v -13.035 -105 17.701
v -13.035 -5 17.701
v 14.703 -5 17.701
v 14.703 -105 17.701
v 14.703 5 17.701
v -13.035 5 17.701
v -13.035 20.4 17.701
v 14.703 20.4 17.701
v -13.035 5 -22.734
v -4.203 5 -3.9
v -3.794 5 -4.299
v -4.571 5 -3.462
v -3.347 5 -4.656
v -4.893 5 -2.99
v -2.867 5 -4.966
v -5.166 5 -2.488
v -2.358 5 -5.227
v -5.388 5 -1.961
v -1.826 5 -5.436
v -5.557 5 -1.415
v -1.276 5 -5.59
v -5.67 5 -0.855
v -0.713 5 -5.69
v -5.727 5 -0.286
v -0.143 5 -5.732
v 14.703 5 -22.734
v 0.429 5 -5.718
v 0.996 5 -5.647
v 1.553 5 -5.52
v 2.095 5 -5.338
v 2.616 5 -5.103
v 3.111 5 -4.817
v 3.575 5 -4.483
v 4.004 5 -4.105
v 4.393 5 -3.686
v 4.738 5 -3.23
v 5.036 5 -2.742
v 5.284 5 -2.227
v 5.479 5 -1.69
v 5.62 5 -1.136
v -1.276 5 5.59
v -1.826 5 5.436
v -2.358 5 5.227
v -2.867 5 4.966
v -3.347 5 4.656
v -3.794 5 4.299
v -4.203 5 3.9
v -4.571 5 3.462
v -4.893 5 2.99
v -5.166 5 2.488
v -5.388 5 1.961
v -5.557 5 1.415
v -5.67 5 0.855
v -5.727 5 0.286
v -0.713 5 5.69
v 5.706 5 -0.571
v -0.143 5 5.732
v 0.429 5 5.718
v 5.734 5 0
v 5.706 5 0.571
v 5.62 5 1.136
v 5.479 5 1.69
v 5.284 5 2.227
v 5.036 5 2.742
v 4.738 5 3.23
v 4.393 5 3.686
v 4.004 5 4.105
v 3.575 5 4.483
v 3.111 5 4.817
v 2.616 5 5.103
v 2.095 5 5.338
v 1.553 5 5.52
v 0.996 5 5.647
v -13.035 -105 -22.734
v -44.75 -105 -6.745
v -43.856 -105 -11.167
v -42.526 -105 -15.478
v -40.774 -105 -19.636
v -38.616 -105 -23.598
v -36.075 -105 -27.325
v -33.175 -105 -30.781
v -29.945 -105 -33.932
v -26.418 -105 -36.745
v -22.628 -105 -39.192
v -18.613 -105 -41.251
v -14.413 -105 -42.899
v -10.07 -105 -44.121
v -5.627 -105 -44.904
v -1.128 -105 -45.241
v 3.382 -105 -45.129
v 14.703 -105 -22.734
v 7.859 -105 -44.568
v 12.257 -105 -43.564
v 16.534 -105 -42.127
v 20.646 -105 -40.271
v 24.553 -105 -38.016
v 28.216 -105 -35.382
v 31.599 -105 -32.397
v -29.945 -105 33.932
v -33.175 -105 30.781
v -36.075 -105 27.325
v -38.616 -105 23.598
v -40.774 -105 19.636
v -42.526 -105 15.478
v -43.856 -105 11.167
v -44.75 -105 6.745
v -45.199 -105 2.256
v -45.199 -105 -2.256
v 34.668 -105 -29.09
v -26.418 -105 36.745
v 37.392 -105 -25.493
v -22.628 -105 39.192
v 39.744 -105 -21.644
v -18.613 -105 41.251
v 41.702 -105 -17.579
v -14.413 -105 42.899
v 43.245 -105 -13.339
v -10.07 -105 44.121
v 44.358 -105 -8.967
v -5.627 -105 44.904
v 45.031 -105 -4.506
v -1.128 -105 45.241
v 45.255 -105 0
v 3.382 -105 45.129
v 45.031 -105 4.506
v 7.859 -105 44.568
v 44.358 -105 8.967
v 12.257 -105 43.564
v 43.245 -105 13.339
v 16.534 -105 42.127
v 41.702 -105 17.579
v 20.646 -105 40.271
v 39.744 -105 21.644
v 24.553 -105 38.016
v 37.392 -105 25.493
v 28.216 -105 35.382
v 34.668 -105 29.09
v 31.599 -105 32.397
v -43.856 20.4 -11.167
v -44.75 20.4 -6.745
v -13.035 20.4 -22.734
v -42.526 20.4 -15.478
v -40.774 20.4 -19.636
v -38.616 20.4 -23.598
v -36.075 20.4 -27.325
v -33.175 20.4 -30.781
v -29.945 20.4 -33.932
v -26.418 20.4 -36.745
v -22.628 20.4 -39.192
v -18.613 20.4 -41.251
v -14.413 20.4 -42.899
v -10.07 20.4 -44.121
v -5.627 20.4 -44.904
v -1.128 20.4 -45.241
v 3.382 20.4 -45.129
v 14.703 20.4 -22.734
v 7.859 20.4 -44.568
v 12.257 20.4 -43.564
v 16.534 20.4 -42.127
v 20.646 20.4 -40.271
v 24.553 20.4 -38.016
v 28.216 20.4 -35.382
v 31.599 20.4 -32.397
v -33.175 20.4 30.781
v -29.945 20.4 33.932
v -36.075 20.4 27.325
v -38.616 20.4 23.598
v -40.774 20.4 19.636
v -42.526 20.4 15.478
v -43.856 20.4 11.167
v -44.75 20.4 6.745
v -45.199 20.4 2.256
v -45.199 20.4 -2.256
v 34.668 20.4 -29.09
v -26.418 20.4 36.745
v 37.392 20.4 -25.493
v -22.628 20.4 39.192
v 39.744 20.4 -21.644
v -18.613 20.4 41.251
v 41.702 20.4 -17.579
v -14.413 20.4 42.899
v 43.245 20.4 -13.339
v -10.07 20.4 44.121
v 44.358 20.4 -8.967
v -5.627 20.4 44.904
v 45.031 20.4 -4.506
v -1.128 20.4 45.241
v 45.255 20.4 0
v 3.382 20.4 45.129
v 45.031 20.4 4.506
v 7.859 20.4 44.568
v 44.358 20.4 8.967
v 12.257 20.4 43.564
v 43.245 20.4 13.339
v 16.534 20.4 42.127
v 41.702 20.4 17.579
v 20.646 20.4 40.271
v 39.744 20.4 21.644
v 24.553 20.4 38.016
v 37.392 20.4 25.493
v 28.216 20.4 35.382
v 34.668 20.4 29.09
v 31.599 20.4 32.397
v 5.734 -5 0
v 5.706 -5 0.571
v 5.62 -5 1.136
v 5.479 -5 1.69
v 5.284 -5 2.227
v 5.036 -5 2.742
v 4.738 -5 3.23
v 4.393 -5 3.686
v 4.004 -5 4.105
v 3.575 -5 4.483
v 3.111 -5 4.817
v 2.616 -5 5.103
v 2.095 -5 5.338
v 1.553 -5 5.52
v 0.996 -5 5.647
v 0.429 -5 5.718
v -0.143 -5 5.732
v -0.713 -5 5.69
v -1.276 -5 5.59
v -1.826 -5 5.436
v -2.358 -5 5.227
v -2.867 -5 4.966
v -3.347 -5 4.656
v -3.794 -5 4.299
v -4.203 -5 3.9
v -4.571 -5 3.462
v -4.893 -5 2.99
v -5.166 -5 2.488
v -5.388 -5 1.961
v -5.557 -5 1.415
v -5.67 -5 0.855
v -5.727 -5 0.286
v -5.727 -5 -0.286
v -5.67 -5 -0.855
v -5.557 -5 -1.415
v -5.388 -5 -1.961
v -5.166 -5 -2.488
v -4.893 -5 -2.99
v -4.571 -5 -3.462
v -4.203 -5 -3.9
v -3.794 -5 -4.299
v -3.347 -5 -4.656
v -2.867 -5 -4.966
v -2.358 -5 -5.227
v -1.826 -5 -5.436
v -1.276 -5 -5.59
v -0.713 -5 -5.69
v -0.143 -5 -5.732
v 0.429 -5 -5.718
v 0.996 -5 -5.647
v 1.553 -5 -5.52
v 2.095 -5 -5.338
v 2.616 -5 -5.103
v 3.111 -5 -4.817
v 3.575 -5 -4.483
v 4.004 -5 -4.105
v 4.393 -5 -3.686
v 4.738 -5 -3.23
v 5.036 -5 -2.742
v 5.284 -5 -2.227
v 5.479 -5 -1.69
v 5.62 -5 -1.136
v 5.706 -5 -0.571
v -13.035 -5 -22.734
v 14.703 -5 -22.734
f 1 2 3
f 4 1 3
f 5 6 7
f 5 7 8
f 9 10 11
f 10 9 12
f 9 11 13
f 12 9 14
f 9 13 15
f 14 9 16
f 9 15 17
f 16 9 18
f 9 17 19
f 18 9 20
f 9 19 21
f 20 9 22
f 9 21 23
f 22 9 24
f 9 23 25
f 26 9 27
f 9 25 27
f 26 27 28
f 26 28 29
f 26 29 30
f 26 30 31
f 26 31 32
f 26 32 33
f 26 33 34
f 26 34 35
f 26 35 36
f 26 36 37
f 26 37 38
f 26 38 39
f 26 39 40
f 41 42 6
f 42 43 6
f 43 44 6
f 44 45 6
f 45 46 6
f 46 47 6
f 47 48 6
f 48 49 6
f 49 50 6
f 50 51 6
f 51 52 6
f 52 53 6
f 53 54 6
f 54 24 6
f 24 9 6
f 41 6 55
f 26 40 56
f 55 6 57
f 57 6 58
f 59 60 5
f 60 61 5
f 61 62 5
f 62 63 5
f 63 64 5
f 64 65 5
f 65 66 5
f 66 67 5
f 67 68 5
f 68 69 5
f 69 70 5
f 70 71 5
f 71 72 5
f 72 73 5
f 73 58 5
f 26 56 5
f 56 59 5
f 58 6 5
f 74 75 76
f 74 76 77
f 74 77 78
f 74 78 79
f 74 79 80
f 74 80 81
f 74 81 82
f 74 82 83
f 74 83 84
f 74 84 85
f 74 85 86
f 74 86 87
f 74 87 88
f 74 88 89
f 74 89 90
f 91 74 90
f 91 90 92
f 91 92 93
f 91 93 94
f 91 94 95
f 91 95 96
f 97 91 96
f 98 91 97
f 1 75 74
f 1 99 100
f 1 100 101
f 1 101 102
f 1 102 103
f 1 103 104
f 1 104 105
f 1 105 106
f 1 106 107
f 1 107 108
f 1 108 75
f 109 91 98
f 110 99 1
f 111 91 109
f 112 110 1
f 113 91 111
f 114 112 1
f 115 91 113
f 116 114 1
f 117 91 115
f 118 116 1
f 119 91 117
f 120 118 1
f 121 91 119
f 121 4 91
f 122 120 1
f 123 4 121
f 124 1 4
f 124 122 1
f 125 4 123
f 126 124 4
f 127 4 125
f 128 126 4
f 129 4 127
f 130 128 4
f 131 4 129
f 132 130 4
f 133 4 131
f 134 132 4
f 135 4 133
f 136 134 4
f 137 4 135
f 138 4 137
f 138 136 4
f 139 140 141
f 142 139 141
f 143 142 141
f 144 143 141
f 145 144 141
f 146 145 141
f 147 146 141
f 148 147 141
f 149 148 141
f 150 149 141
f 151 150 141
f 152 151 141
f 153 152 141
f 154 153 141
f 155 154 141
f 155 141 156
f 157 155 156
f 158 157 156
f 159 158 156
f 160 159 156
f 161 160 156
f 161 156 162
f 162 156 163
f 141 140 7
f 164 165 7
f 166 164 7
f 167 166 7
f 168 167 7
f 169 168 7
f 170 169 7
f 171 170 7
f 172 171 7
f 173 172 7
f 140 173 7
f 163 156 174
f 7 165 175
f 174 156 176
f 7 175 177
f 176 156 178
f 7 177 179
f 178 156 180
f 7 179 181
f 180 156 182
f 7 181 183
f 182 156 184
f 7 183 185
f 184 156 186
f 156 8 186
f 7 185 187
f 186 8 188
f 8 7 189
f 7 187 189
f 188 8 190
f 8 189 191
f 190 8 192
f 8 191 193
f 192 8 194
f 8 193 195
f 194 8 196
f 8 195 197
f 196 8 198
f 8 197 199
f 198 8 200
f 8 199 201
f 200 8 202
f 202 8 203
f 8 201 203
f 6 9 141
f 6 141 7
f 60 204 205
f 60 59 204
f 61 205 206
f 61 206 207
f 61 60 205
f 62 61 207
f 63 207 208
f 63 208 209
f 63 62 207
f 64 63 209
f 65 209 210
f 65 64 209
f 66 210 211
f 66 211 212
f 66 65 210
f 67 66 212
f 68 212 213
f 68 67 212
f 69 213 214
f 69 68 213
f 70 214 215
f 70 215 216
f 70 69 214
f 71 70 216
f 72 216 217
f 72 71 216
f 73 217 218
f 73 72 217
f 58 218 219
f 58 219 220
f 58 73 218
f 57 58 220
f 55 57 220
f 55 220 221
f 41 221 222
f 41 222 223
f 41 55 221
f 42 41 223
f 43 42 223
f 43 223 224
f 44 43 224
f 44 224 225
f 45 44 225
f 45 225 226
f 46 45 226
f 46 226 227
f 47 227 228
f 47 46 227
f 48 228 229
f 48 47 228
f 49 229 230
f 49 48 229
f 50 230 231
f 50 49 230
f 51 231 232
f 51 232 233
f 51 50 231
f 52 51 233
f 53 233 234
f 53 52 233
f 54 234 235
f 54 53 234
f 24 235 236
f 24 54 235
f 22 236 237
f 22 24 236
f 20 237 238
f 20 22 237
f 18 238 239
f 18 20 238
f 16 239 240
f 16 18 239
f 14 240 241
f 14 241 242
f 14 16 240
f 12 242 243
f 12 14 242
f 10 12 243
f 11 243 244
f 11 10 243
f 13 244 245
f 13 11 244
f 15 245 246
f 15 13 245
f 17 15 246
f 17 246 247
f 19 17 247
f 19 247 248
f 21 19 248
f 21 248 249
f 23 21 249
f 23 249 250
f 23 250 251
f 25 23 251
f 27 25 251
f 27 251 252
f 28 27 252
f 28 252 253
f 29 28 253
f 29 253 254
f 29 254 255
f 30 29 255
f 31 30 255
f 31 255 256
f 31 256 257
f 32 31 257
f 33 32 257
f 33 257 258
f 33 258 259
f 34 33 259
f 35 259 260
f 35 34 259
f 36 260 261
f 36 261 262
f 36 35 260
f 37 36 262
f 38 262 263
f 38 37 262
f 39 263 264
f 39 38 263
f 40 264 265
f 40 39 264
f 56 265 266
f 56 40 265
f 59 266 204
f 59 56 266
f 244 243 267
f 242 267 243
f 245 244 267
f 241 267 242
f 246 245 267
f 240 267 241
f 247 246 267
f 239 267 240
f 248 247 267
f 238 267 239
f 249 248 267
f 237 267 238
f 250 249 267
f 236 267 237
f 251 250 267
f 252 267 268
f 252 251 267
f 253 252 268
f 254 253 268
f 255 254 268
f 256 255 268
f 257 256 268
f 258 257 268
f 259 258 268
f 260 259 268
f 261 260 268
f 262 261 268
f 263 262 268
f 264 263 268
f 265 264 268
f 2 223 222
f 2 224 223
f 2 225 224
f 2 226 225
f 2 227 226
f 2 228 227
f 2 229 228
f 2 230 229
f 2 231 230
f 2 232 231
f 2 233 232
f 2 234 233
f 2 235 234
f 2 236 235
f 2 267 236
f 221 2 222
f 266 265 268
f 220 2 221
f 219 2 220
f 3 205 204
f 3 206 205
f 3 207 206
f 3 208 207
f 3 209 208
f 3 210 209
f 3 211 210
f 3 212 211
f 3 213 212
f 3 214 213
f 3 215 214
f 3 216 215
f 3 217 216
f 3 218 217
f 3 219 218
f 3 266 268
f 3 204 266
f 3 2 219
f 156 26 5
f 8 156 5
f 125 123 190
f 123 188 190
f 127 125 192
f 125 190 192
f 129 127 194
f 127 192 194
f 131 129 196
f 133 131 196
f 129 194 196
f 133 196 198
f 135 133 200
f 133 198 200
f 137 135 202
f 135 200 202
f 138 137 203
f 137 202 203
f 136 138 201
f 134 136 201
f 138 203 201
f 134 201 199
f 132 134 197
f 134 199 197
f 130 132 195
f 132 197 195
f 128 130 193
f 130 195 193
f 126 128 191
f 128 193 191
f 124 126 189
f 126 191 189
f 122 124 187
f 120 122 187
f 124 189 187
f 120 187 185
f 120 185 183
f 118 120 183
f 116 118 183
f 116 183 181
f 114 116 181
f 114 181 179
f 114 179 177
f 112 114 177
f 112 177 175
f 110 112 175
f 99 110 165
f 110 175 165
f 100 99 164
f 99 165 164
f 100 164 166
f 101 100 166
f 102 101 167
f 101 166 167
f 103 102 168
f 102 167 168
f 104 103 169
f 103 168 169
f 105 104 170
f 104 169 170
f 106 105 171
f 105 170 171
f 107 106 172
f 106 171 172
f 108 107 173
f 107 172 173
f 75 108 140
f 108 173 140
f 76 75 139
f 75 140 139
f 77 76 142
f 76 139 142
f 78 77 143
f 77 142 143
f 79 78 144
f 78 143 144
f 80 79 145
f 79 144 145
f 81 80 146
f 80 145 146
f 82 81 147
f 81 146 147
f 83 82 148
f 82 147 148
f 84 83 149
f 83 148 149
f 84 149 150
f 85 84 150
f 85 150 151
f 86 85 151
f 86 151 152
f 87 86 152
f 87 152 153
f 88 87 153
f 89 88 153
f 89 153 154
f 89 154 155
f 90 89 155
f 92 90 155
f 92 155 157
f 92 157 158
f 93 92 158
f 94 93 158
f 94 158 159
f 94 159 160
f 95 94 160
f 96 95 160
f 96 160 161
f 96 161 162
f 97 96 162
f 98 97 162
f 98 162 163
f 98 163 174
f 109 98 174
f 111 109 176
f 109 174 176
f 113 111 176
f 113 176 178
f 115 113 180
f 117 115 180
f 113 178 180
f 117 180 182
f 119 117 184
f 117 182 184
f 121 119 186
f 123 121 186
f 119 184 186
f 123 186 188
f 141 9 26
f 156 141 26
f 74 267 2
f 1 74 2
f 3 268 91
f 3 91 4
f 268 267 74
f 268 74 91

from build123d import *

# Parameters (mm, degrees)
F0_R          = 45.255389
F0_R_2        = 5.734106
F1_DEPTH      = 5
F2_R          = 45.255389
F2_W          = 27.738073
F2_H          = 40.435255
F3_DEPTH      = 100
F3_DEPTH_BACK = 25.4


with BuildPart() as f1:
    # F0 (on Front) → F1 (new body, symmetric)
    with BuildSketch(Plane.XZ):
        Circle(F0_R)
        Circle(F0_R_2, mode=Mode.SUBTRACT)
    extrude(amount=F1_DEPTH, both=True)

    # F2 (on face) → F3 (join, two sides)
    with BuildSketch(Plane.XZ.offset(5)) as f3_sk:
        Circle(F2_R)
        with Locations((0.834415, -2.516448)):
            Rectangle(F2_W, F2_H, mode=Mode.SUBTRACT)
    extrude(amount=F3_DEPTH)
    extrude(f3_sk.sketch, amount=-F3_DEPTH_BACK)


solid = f1.part
